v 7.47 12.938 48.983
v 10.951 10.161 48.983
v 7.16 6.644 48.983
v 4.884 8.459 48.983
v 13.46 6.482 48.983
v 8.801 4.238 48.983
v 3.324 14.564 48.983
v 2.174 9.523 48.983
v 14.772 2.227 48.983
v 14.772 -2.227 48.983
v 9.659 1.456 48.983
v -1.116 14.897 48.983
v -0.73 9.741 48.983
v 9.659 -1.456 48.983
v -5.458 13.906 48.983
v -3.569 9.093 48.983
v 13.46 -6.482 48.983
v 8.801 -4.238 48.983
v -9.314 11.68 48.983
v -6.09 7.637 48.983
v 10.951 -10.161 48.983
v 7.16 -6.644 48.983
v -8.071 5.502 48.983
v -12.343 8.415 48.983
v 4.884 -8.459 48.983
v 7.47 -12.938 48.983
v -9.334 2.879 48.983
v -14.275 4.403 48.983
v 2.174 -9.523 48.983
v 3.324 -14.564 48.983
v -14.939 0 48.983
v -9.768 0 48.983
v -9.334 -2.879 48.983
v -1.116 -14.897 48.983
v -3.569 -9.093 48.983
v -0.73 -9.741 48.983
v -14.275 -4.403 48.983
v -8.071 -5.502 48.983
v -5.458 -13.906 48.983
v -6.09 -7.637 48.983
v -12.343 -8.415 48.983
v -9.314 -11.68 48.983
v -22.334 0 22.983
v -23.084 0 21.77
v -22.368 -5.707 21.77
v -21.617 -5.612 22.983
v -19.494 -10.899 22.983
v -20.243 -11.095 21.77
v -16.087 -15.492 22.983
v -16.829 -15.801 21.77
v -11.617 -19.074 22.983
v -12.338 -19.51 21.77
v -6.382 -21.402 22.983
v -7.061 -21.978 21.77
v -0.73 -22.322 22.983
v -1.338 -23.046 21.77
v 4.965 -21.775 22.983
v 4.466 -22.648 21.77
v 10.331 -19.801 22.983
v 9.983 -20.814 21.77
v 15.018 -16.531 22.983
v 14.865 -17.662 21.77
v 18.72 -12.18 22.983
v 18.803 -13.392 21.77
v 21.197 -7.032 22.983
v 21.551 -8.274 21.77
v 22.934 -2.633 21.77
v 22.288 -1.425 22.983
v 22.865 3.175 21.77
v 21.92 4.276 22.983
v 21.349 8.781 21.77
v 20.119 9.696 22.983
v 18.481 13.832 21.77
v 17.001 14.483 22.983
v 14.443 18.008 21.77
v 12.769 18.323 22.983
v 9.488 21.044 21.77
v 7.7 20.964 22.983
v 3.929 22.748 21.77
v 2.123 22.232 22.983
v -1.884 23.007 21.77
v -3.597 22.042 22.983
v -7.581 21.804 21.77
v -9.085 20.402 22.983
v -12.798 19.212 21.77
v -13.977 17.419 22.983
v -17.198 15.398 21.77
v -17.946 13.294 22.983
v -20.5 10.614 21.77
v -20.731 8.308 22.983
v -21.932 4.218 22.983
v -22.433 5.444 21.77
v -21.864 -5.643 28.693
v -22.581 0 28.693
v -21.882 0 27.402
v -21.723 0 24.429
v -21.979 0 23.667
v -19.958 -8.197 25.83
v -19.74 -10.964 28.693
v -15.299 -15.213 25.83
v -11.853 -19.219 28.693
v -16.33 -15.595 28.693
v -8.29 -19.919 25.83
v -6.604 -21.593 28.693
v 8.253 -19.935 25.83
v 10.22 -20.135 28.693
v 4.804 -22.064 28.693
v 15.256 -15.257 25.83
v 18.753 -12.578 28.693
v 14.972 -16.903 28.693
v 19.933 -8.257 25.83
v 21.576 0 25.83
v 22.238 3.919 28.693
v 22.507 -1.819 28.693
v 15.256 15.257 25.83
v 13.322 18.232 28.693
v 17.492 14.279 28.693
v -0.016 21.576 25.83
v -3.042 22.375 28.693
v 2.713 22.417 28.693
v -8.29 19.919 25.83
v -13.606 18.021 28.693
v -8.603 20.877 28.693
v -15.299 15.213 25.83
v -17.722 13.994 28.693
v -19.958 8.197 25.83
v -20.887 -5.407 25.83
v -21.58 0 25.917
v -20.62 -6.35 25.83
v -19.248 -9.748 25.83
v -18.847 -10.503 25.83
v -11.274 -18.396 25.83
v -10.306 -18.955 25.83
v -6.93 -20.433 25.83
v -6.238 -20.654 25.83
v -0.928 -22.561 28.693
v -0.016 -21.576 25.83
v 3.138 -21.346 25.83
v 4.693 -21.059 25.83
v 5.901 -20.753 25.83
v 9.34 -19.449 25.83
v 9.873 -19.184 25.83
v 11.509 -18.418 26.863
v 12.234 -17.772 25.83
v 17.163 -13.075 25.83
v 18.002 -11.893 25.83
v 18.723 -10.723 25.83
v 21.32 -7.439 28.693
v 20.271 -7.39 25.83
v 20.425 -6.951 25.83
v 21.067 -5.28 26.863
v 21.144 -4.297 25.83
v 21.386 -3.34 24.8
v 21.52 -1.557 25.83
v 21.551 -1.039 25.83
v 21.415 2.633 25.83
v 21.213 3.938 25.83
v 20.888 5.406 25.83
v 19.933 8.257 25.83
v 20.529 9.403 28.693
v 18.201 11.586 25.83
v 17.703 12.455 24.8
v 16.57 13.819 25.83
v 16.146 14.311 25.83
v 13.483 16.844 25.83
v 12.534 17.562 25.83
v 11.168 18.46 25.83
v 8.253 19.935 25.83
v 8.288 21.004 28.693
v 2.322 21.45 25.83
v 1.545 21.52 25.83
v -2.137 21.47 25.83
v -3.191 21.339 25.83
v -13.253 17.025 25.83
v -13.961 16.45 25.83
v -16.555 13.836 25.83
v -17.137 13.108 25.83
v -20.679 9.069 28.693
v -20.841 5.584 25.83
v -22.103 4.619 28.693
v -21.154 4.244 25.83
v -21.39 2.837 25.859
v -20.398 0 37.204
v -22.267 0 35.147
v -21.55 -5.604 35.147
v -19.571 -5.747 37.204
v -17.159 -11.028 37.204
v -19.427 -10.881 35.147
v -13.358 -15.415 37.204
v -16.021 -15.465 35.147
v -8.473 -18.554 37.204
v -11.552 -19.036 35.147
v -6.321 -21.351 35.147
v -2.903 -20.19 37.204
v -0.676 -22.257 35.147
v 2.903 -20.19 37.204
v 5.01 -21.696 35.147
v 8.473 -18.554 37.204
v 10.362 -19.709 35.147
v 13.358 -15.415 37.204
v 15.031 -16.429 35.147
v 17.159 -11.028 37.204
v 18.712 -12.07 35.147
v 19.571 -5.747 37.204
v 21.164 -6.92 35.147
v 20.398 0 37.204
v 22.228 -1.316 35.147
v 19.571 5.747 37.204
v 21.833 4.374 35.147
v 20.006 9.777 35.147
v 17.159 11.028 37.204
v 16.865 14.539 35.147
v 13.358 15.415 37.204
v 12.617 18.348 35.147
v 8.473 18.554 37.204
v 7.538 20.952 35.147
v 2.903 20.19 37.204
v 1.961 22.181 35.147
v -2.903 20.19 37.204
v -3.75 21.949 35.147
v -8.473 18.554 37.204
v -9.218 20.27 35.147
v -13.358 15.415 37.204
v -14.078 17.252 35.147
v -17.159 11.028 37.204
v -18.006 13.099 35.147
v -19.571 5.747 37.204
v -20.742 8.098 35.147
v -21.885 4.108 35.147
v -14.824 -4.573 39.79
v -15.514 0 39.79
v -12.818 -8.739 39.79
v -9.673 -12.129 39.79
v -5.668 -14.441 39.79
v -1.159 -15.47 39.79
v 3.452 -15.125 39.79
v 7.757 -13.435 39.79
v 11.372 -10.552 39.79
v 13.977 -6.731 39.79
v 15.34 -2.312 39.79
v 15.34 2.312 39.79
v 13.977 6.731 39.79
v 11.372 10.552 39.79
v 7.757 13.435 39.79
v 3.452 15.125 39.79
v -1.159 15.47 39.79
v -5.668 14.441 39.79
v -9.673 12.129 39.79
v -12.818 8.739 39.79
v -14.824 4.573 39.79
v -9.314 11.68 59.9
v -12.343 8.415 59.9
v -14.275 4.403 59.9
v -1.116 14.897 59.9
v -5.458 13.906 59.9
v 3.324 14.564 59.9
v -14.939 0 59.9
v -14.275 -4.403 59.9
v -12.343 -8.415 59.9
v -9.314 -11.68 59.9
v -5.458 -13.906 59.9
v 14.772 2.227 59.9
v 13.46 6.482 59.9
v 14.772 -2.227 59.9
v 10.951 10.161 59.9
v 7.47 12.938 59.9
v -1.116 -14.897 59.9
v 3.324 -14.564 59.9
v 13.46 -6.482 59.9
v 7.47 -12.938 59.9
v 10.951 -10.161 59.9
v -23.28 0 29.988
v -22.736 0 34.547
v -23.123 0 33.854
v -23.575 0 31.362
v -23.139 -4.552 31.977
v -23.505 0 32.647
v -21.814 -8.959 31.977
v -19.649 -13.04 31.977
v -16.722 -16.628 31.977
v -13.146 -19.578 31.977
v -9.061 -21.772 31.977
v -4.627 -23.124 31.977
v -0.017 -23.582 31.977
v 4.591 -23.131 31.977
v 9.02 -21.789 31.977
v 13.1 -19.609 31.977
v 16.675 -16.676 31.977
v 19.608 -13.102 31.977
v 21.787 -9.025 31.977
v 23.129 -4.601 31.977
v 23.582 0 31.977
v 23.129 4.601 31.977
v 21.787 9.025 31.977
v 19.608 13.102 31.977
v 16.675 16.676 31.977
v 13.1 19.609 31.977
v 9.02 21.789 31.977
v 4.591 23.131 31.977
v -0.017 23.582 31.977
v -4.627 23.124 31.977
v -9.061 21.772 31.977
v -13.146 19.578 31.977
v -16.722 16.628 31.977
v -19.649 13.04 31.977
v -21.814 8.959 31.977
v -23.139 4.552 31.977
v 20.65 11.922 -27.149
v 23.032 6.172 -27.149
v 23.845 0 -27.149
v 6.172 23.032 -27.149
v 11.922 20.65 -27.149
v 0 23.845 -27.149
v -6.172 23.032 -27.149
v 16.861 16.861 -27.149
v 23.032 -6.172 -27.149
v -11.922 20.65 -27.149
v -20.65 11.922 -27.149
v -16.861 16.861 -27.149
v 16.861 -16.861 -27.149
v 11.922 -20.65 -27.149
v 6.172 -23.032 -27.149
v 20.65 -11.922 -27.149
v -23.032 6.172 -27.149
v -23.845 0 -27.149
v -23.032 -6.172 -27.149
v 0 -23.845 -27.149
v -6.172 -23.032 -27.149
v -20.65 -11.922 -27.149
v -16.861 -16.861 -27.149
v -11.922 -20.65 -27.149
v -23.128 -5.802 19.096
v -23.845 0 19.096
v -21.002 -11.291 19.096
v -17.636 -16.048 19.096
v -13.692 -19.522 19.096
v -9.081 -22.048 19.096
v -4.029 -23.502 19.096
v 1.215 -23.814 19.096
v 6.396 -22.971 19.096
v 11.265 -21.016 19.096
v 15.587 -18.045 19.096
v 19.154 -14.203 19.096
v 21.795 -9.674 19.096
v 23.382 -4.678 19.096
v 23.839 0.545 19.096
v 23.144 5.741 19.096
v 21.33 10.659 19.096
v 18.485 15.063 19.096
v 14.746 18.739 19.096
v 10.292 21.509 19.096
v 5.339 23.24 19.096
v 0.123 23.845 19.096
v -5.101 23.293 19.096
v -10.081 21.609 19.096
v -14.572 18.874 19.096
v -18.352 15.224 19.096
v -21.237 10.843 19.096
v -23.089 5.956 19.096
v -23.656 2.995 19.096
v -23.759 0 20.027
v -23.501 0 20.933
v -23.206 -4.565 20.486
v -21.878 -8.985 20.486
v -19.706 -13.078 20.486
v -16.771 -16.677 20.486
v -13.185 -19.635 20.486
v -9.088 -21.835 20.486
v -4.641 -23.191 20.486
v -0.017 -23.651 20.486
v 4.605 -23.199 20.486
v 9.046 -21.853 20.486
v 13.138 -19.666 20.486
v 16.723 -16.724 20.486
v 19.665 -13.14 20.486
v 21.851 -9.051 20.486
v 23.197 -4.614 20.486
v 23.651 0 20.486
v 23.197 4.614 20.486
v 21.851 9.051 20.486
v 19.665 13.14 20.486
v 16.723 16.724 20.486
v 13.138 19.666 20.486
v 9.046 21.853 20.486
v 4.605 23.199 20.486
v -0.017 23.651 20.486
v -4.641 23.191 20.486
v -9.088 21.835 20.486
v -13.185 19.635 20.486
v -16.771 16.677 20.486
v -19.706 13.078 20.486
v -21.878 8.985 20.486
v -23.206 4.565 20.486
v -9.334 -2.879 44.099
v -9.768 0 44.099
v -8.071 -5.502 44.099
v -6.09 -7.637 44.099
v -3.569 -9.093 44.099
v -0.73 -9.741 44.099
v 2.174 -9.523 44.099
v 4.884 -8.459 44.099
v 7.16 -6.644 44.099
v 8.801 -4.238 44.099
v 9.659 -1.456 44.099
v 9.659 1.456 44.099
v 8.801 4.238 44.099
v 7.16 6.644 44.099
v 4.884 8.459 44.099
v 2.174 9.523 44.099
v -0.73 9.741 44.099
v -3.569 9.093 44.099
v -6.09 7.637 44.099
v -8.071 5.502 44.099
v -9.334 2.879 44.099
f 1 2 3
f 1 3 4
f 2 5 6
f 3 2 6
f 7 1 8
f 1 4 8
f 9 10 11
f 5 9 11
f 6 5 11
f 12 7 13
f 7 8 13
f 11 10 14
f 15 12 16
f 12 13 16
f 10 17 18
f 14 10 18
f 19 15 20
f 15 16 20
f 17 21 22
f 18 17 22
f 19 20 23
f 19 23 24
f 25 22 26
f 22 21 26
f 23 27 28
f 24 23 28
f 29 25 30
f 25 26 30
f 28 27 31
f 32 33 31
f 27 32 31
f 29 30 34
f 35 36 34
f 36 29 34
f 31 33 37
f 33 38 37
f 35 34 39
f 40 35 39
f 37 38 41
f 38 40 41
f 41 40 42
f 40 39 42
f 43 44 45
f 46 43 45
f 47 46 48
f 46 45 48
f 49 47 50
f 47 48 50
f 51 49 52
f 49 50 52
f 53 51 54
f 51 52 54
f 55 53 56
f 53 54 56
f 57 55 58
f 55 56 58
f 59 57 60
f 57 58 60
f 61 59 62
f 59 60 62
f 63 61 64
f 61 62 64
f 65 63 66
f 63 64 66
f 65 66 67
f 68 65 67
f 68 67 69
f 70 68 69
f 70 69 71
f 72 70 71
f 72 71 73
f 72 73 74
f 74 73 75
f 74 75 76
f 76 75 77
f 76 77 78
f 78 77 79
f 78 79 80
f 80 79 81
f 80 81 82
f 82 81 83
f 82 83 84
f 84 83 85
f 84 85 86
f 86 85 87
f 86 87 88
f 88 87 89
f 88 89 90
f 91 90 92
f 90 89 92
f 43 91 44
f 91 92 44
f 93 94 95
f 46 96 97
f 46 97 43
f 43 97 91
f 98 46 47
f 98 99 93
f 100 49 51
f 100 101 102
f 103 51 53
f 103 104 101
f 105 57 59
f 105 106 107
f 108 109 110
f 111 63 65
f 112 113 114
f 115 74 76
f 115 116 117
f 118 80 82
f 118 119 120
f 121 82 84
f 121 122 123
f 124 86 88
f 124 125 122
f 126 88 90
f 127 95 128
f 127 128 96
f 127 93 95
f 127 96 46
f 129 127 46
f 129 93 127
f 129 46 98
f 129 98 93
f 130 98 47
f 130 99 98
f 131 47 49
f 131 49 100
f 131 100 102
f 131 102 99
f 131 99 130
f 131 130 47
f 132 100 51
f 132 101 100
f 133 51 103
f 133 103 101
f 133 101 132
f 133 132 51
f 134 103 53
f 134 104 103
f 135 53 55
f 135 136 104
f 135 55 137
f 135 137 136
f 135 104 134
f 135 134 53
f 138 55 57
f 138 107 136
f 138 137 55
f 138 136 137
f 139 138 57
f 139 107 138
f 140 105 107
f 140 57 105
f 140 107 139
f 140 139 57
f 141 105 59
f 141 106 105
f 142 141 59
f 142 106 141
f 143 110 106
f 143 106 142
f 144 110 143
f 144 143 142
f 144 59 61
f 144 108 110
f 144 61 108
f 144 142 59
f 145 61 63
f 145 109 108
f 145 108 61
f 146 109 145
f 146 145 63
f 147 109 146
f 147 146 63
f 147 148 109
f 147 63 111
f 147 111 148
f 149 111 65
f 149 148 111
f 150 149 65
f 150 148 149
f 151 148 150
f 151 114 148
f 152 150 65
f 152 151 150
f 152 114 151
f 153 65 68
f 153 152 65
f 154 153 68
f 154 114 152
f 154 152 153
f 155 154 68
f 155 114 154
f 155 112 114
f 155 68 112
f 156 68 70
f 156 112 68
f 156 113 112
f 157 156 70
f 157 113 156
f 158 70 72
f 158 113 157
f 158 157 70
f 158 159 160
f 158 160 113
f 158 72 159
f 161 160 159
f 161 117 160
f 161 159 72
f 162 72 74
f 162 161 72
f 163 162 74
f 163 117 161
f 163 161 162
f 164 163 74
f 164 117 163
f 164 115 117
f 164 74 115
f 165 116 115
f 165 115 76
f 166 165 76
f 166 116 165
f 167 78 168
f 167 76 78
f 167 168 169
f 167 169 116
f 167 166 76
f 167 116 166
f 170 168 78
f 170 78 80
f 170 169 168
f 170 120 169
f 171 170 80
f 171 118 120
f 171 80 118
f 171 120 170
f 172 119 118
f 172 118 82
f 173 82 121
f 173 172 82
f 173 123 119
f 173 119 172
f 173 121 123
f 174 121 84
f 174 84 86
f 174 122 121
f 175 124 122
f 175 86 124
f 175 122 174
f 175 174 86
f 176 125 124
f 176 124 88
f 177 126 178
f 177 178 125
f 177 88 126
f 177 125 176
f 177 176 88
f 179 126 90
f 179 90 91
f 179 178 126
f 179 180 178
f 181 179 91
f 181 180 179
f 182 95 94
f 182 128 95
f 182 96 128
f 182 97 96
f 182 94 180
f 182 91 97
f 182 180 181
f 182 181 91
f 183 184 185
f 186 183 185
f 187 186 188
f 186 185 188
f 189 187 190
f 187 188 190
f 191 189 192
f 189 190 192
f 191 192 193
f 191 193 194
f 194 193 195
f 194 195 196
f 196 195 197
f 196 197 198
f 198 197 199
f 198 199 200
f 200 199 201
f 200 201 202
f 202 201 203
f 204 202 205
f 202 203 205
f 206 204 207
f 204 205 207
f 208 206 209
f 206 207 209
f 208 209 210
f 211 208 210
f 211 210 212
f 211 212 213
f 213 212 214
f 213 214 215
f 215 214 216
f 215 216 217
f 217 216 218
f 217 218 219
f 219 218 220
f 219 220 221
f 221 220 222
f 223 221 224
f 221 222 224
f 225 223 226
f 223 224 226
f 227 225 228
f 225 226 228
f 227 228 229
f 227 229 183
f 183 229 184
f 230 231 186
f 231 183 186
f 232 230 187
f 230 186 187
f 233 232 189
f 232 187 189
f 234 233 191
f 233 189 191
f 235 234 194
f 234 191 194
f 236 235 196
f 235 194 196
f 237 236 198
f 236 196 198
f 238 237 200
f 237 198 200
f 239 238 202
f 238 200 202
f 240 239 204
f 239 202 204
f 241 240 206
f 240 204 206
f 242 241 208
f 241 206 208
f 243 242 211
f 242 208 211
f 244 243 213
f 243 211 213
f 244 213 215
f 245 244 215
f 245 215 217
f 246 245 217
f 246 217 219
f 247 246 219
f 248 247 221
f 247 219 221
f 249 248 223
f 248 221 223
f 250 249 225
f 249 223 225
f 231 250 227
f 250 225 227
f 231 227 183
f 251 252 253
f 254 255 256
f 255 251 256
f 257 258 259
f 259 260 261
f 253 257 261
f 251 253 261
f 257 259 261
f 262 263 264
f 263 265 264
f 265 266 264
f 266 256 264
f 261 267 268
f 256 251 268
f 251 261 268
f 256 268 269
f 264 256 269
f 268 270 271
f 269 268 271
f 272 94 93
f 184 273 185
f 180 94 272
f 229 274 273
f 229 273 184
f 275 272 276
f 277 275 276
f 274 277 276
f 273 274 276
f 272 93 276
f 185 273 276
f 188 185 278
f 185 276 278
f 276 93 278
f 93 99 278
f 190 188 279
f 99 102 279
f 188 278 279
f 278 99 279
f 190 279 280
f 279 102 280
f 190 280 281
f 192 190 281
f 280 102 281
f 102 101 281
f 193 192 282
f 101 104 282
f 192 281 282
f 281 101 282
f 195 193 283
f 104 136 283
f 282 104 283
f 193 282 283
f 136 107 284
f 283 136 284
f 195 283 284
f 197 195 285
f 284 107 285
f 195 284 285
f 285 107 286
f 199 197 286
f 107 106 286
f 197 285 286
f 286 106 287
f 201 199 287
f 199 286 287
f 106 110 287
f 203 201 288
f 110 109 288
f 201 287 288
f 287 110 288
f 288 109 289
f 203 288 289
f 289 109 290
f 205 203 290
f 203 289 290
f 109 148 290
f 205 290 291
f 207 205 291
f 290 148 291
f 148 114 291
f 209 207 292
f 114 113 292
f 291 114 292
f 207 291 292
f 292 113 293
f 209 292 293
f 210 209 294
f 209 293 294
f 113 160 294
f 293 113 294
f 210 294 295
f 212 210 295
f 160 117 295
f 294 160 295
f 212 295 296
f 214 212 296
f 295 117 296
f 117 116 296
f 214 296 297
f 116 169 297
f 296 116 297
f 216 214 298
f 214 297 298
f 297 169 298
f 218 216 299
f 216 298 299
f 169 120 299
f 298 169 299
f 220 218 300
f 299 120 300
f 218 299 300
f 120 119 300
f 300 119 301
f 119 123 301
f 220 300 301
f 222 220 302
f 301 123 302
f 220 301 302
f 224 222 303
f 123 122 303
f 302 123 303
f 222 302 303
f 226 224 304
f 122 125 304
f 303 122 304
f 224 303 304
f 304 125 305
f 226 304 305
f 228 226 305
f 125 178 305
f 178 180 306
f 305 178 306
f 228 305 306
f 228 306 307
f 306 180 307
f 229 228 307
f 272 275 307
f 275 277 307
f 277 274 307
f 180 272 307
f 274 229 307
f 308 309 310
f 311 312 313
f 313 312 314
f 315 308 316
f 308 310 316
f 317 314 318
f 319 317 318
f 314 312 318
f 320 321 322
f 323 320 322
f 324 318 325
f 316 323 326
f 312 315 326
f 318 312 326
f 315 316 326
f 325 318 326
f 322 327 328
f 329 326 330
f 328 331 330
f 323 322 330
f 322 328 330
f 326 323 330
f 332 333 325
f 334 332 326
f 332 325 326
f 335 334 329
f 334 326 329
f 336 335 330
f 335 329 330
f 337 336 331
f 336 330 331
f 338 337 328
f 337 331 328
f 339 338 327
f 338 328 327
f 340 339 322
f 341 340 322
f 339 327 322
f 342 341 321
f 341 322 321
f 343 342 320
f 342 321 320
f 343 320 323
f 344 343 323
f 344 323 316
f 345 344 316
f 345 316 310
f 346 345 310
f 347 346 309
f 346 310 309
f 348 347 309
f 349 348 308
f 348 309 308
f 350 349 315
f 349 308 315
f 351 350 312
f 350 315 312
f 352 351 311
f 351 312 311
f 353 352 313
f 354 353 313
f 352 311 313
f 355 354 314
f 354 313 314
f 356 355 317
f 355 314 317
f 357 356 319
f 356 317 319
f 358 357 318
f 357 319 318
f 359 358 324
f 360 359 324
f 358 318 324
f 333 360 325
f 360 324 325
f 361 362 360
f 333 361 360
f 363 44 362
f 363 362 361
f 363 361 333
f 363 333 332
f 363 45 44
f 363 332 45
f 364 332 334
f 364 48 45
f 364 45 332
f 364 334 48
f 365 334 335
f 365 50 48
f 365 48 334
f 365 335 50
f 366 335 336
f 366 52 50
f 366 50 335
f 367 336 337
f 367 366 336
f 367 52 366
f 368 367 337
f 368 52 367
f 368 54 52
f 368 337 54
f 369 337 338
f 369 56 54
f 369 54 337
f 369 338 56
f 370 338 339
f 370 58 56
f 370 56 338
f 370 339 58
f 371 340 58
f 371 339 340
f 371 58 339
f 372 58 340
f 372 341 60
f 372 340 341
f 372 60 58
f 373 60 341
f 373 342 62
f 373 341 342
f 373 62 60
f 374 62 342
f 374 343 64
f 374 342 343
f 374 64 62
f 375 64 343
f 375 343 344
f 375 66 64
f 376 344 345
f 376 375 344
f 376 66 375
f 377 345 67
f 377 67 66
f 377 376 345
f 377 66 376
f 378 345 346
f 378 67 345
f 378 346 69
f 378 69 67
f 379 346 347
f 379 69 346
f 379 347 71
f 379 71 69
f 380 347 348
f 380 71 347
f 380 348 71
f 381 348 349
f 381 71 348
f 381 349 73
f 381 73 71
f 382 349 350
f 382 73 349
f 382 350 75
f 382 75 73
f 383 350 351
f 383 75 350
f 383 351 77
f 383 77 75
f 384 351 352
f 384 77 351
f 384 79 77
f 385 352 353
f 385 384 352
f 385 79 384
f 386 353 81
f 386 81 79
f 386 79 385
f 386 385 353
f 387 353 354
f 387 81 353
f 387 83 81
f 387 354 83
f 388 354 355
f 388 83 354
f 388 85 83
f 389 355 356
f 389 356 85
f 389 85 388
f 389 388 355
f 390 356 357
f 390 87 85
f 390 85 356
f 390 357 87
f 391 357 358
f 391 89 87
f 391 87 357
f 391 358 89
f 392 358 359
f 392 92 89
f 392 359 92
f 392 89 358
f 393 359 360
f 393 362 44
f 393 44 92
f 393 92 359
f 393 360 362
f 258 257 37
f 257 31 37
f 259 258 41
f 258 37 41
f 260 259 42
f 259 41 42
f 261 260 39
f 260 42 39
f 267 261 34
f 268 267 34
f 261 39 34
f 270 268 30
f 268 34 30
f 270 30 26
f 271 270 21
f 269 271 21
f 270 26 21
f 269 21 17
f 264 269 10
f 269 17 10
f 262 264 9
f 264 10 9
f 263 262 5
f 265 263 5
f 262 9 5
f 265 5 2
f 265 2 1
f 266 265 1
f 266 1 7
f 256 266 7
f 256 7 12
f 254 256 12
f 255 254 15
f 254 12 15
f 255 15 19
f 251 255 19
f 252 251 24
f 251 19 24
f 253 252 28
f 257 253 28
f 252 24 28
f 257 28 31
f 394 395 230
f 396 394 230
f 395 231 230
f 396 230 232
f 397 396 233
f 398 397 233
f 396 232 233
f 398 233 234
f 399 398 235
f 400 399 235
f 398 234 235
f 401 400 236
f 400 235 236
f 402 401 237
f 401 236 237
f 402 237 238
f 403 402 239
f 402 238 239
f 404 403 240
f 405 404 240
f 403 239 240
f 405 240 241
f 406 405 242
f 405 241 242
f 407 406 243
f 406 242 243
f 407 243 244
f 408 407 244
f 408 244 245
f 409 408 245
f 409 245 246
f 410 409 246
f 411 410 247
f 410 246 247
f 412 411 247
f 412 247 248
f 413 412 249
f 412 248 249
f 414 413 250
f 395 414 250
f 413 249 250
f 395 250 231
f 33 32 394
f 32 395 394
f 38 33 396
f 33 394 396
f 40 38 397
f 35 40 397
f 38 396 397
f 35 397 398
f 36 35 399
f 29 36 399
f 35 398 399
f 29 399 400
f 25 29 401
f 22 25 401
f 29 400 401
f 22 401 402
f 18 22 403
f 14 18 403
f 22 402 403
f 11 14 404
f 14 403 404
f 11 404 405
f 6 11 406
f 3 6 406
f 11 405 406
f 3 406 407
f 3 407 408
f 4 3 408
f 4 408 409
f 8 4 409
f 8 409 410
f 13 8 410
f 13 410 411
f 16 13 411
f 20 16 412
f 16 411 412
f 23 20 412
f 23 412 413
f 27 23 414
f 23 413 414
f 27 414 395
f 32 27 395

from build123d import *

# Parameters (mm, degrees)
F2_R = 5.08
F3_R = 5.08


with BuildPart() as f1:
    # F0 (on Front) → F1 (revolve)
    with BuildSketch(Plane.XZ):
        Polygon((0, -27.148815), (0, 59.899766), (-14.939032, 59.899766), (-14.939032, 48.982784), (-9.767827, 48.982784), (-9.767827, 44.098869), (-15.51361, 39.789535), (-20.397522, 37.203934), (-25.558326, 31.527043), (-20.110233, 26.574237), (-23.844991, 20.541167), (-23.844991, -4.165691), (-23.844991, -27.148815), align=None)
    revolve(axis=Axis((0, 0, 16.375476), (0, 0, 1)))

    # F2
    f2_edges = [f1.edges().sort_by_distance(p)[0] for p in [
        (20.110233, 0, 26.574237),
        (23.844991, 0, 20.541167),
        (-21.977612, 0, 23.557702),
    ]]
    fillet(f2_edges, radius=F2_R)

    # F3
    f3_edges = [f1.edges().sort_by_distance(p)[0] for p in [
        (25.558326, 0, 31.527043),
    ]]
    fillet(f3_edges, radius=F3_R)


solid = f1.part
